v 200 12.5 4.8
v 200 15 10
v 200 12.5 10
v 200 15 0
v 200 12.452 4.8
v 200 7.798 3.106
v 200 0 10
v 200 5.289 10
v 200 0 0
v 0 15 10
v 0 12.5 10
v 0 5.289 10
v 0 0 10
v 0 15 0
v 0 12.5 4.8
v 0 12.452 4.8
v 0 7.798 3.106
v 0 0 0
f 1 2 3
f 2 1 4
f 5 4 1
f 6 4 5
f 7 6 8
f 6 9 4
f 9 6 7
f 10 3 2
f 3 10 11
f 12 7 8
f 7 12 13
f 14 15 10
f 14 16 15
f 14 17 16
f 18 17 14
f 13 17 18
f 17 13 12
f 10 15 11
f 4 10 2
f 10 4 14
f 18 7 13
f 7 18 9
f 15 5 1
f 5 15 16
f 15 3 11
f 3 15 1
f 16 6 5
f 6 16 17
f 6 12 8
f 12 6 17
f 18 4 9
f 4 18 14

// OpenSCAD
translate([0,0,-5]){
    difference(){
        cube([200,15,15]){}
        translate([-1,7.5,9.8]){
            cube([302,5,6]){}
        }
        rotate([20,0,0]){
            translate([-2,10.1,4.95]){
                cube([302,5,8]){}
            }
        }
        translate([-1,-1,-1]){
            cube([202,17,6]){}
        }    
    }
}
